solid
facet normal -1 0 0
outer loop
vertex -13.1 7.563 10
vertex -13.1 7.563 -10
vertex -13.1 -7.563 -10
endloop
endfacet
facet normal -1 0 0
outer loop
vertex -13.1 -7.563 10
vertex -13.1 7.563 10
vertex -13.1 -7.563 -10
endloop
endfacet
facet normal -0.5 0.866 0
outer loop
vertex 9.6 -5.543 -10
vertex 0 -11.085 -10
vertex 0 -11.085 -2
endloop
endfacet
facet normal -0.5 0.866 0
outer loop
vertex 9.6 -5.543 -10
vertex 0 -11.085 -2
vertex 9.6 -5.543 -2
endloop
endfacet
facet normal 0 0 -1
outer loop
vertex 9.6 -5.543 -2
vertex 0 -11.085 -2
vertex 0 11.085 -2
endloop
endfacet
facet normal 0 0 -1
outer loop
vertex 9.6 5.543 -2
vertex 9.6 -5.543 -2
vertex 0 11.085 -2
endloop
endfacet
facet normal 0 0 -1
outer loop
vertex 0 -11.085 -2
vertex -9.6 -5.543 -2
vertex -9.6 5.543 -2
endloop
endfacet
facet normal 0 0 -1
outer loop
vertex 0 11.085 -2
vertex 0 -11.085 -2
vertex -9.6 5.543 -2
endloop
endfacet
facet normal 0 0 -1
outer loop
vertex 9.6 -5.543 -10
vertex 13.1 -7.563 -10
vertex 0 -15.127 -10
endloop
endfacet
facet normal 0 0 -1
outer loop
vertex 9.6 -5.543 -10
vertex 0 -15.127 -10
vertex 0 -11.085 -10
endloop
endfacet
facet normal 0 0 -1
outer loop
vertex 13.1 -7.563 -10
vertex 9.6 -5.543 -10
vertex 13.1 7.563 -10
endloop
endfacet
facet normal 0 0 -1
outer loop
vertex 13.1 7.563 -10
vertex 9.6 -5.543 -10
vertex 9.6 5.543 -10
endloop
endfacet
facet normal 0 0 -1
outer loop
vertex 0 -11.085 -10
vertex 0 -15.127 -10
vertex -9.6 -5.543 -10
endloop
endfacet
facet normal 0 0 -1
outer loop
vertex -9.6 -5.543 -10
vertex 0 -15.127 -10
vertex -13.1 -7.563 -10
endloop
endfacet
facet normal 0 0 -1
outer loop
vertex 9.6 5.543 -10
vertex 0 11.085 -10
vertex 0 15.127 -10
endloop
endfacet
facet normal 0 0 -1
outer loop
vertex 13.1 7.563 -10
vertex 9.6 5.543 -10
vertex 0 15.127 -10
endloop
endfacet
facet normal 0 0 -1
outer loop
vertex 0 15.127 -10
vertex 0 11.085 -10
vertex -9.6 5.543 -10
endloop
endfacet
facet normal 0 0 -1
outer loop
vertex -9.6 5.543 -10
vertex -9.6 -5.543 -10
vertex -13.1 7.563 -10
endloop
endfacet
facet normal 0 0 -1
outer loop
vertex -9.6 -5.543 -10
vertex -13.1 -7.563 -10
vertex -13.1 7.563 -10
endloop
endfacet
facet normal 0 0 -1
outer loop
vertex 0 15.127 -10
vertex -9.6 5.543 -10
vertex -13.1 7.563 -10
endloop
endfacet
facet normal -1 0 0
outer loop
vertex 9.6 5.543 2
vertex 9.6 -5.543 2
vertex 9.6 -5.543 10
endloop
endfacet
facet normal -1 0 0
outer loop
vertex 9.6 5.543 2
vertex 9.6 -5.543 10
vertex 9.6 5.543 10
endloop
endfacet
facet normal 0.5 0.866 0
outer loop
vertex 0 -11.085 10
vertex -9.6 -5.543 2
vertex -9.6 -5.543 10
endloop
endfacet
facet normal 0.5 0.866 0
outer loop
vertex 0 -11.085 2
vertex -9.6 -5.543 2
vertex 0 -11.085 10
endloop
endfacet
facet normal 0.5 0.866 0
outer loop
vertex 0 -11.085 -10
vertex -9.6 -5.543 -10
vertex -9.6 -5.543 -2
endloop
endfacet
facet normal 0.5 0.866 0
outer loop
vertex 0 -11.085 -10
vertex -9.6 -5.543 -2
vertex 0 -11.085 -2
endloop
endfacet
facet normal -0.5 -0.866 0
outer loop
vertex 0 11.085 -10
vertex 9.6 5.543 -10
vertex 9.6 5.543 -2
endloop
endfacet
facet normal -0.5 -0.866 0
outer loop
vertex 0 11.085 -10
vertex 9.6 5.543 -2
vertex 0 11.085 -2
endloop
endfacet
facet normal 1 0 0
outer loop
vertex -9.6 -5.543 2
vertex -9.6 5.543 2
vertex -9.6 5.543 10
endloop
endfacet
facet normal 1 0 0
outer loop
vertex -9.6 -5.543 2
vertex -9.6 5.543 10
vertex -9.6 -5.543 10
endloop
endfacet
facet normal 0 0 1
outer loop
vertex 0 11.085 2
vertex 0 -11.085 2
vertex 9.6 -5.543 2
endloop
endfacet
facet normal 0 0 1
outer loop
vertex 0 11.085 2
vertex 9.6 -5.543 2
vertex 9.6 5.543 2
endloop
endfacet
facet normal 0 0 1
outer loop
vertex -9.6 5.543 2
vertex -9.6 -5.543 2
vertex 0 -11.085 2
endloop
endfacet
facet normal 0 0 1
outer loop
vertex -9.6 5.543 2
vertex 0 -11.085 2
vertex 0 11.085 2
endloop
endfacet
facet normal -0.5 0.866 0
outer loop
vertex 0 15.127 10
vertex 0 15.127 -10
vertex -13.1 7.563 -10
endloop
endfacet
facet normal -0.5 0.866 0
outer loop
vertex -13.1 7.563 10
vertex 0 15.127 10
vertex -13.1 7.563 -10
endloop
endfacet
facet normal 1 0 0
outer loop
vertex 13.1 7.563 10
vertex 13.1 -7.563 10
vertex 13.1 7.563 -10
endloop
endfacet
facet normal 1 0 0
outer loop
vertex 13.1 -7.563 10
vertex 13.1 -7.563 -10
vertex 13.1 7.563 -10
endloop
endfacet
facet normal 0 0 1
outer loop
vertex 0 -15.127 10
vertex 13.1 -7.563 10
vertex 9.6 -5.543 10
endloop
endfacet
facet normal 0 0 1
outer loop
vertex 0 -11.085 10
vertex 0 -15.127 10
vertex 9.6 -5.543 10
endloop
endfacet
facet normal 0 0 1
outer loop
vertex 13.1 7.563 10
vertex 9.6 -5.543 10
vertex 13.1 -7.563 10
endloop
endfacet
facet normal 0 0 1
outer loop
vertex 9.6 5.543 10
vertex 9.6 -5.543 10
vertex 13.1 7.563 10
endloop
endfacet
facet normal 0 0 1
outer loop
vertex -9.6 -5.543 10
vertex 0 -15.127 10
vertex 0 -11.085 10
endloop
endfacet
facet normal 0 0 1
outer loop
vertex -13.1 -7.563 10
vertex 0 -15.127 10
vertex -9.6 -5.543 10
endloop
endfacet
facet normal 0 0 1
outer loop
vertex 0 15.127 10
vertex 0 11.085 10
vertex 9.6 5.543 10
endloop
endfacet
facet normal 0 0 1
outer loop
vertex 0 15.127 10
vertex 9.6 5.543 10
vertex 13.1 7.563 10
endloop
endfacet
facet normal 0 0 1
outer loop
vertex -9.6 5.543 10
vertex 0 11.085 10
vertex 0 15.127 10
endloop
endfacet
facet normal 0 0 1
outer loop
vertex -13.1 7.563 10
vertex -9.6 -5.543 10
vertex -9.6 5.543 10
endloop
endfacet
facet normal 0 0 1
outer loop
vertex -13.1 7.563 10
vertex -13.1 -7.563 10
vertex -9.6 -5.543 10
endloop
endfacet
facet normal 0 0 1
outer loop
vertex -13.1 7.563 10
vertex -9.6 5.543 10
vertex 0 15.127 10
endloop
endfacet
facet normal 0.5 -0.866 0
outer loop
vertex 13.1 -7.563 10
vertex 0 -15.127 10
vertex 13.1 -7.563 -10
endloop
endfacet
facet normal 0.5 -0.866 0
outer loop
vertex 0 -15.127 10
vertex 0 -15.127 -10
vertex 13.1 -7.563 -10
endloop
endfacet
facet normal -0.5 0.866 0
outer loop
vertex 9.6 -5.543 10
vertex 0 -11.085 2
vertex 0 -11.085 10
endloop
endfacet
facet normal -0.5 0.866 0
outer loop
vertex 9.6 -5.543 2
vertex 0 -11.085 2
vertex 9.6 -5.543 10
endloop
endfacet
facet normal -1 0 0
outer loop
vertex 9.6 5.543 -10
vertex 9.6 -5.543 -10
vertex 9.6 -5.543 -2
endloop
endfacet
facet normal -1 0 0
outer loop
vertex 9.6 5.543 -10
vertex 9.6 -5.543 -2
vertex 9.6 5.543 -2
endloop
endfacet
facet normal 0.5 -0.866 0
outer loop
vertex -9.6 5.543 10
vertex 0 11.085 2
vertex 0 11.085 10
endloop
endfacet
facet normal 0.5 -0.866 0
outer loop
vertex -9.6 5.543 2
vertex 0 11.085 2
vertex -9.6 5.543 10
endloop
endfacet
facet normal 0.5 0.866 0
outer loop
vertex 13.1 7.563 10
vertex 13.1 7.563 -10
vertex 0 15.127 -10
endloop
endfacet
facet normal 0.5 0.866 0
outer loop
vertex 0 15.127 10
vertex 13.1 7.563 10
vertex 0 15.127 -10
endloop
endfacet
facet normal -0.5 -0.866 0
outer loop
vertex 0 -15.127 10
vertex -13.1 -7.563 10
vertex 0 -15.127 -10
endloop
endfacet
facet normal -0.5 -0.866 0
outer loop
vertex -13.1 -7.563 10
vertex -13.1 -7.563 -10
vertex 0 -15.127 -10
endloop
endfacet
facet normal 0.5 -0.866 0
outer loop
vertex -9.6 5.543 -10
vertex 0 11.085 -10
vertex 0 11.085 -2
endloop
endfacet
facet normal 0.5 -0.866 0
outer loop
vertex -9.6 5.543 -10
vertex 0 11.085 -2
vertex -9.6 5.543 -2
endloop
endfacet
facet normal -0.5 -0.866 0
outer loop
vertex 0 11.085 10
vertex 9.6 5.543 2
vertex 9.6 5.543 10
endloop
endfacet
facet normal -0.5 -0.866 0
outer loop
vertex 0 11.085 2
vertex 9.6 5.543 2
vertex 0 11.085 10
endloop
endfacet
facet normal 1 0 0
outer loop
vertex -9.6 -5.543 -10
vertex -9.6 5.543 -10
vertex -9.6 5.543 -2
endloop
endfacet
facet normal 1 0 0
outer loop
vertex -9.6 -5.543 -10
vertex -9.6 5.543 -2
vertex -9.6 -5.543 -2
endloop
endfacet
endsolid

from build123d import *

# Parameters (mm, degrees)
BOSS_EXTRUDE1_DEPTH      = 10
BOSS_EXTRUDE1_DEPTH_BACK = 10
BOSS_EXTRUDE2_DEPTH      = 2
BOSS_EXTRUDE2_DEPTH_BACK = 2


with BuildPart() as part:
    # Sketch1 → Boss-Extrude1 (new, two sides: drawn at the far end of the back side and taken through both)
    with BuildSketch(Plane(origin=(0, 0, 0), x_dir=(0, 1, 0), z_dir=(0, 0, 1)).offset(-BOSS_EXTRUDE1_DEPTH_BACK)):
        Polygon((7.563288526, 13.1), (-7.563288526, 13.1), (-15.126577053, 0), (-7.563288526, -13.1), (7.563288526, -13.1), (15.126577053, 0), align=None)
        Polygon((5.542562584, 9.6), (-5.542562584, 9.6), (-11.085125168, 0), (-5.542562584, -9.6), (5.542562584, -9.6), (11.085125168, 0), align=None, mode=Mode.SUBTRACT)
    extrude(amount=BOSS_EXTRUDE1_DEPTH + BOSS_EXTRUDE1_DEPTH_BACK)

    # Sketch2 → Boss-Extrude2 (add, two sides: drawn at the far end of the back side and taken through both)
    with BuildSketch(Plane(origin=(0, 0, 0), x_dir=(0, 1, 0), z_dir=(0, 0, 1)).offset(-BOSS_EXTRUDE2_DEPTH_BACK)):
        Polygon((15.126577053, 0), (7.563288526, 13.1), (-7.563288526, 13.1), (-15.126577053, 0), (-7.563288526, -13.1), (7.563288526, -13.1), align=None)
    extrude(amount=BOSS_EXTRUDE2_DEPTH + BOSS_EXTRUDE2_DEPTH_BACK)


solid = part.part
